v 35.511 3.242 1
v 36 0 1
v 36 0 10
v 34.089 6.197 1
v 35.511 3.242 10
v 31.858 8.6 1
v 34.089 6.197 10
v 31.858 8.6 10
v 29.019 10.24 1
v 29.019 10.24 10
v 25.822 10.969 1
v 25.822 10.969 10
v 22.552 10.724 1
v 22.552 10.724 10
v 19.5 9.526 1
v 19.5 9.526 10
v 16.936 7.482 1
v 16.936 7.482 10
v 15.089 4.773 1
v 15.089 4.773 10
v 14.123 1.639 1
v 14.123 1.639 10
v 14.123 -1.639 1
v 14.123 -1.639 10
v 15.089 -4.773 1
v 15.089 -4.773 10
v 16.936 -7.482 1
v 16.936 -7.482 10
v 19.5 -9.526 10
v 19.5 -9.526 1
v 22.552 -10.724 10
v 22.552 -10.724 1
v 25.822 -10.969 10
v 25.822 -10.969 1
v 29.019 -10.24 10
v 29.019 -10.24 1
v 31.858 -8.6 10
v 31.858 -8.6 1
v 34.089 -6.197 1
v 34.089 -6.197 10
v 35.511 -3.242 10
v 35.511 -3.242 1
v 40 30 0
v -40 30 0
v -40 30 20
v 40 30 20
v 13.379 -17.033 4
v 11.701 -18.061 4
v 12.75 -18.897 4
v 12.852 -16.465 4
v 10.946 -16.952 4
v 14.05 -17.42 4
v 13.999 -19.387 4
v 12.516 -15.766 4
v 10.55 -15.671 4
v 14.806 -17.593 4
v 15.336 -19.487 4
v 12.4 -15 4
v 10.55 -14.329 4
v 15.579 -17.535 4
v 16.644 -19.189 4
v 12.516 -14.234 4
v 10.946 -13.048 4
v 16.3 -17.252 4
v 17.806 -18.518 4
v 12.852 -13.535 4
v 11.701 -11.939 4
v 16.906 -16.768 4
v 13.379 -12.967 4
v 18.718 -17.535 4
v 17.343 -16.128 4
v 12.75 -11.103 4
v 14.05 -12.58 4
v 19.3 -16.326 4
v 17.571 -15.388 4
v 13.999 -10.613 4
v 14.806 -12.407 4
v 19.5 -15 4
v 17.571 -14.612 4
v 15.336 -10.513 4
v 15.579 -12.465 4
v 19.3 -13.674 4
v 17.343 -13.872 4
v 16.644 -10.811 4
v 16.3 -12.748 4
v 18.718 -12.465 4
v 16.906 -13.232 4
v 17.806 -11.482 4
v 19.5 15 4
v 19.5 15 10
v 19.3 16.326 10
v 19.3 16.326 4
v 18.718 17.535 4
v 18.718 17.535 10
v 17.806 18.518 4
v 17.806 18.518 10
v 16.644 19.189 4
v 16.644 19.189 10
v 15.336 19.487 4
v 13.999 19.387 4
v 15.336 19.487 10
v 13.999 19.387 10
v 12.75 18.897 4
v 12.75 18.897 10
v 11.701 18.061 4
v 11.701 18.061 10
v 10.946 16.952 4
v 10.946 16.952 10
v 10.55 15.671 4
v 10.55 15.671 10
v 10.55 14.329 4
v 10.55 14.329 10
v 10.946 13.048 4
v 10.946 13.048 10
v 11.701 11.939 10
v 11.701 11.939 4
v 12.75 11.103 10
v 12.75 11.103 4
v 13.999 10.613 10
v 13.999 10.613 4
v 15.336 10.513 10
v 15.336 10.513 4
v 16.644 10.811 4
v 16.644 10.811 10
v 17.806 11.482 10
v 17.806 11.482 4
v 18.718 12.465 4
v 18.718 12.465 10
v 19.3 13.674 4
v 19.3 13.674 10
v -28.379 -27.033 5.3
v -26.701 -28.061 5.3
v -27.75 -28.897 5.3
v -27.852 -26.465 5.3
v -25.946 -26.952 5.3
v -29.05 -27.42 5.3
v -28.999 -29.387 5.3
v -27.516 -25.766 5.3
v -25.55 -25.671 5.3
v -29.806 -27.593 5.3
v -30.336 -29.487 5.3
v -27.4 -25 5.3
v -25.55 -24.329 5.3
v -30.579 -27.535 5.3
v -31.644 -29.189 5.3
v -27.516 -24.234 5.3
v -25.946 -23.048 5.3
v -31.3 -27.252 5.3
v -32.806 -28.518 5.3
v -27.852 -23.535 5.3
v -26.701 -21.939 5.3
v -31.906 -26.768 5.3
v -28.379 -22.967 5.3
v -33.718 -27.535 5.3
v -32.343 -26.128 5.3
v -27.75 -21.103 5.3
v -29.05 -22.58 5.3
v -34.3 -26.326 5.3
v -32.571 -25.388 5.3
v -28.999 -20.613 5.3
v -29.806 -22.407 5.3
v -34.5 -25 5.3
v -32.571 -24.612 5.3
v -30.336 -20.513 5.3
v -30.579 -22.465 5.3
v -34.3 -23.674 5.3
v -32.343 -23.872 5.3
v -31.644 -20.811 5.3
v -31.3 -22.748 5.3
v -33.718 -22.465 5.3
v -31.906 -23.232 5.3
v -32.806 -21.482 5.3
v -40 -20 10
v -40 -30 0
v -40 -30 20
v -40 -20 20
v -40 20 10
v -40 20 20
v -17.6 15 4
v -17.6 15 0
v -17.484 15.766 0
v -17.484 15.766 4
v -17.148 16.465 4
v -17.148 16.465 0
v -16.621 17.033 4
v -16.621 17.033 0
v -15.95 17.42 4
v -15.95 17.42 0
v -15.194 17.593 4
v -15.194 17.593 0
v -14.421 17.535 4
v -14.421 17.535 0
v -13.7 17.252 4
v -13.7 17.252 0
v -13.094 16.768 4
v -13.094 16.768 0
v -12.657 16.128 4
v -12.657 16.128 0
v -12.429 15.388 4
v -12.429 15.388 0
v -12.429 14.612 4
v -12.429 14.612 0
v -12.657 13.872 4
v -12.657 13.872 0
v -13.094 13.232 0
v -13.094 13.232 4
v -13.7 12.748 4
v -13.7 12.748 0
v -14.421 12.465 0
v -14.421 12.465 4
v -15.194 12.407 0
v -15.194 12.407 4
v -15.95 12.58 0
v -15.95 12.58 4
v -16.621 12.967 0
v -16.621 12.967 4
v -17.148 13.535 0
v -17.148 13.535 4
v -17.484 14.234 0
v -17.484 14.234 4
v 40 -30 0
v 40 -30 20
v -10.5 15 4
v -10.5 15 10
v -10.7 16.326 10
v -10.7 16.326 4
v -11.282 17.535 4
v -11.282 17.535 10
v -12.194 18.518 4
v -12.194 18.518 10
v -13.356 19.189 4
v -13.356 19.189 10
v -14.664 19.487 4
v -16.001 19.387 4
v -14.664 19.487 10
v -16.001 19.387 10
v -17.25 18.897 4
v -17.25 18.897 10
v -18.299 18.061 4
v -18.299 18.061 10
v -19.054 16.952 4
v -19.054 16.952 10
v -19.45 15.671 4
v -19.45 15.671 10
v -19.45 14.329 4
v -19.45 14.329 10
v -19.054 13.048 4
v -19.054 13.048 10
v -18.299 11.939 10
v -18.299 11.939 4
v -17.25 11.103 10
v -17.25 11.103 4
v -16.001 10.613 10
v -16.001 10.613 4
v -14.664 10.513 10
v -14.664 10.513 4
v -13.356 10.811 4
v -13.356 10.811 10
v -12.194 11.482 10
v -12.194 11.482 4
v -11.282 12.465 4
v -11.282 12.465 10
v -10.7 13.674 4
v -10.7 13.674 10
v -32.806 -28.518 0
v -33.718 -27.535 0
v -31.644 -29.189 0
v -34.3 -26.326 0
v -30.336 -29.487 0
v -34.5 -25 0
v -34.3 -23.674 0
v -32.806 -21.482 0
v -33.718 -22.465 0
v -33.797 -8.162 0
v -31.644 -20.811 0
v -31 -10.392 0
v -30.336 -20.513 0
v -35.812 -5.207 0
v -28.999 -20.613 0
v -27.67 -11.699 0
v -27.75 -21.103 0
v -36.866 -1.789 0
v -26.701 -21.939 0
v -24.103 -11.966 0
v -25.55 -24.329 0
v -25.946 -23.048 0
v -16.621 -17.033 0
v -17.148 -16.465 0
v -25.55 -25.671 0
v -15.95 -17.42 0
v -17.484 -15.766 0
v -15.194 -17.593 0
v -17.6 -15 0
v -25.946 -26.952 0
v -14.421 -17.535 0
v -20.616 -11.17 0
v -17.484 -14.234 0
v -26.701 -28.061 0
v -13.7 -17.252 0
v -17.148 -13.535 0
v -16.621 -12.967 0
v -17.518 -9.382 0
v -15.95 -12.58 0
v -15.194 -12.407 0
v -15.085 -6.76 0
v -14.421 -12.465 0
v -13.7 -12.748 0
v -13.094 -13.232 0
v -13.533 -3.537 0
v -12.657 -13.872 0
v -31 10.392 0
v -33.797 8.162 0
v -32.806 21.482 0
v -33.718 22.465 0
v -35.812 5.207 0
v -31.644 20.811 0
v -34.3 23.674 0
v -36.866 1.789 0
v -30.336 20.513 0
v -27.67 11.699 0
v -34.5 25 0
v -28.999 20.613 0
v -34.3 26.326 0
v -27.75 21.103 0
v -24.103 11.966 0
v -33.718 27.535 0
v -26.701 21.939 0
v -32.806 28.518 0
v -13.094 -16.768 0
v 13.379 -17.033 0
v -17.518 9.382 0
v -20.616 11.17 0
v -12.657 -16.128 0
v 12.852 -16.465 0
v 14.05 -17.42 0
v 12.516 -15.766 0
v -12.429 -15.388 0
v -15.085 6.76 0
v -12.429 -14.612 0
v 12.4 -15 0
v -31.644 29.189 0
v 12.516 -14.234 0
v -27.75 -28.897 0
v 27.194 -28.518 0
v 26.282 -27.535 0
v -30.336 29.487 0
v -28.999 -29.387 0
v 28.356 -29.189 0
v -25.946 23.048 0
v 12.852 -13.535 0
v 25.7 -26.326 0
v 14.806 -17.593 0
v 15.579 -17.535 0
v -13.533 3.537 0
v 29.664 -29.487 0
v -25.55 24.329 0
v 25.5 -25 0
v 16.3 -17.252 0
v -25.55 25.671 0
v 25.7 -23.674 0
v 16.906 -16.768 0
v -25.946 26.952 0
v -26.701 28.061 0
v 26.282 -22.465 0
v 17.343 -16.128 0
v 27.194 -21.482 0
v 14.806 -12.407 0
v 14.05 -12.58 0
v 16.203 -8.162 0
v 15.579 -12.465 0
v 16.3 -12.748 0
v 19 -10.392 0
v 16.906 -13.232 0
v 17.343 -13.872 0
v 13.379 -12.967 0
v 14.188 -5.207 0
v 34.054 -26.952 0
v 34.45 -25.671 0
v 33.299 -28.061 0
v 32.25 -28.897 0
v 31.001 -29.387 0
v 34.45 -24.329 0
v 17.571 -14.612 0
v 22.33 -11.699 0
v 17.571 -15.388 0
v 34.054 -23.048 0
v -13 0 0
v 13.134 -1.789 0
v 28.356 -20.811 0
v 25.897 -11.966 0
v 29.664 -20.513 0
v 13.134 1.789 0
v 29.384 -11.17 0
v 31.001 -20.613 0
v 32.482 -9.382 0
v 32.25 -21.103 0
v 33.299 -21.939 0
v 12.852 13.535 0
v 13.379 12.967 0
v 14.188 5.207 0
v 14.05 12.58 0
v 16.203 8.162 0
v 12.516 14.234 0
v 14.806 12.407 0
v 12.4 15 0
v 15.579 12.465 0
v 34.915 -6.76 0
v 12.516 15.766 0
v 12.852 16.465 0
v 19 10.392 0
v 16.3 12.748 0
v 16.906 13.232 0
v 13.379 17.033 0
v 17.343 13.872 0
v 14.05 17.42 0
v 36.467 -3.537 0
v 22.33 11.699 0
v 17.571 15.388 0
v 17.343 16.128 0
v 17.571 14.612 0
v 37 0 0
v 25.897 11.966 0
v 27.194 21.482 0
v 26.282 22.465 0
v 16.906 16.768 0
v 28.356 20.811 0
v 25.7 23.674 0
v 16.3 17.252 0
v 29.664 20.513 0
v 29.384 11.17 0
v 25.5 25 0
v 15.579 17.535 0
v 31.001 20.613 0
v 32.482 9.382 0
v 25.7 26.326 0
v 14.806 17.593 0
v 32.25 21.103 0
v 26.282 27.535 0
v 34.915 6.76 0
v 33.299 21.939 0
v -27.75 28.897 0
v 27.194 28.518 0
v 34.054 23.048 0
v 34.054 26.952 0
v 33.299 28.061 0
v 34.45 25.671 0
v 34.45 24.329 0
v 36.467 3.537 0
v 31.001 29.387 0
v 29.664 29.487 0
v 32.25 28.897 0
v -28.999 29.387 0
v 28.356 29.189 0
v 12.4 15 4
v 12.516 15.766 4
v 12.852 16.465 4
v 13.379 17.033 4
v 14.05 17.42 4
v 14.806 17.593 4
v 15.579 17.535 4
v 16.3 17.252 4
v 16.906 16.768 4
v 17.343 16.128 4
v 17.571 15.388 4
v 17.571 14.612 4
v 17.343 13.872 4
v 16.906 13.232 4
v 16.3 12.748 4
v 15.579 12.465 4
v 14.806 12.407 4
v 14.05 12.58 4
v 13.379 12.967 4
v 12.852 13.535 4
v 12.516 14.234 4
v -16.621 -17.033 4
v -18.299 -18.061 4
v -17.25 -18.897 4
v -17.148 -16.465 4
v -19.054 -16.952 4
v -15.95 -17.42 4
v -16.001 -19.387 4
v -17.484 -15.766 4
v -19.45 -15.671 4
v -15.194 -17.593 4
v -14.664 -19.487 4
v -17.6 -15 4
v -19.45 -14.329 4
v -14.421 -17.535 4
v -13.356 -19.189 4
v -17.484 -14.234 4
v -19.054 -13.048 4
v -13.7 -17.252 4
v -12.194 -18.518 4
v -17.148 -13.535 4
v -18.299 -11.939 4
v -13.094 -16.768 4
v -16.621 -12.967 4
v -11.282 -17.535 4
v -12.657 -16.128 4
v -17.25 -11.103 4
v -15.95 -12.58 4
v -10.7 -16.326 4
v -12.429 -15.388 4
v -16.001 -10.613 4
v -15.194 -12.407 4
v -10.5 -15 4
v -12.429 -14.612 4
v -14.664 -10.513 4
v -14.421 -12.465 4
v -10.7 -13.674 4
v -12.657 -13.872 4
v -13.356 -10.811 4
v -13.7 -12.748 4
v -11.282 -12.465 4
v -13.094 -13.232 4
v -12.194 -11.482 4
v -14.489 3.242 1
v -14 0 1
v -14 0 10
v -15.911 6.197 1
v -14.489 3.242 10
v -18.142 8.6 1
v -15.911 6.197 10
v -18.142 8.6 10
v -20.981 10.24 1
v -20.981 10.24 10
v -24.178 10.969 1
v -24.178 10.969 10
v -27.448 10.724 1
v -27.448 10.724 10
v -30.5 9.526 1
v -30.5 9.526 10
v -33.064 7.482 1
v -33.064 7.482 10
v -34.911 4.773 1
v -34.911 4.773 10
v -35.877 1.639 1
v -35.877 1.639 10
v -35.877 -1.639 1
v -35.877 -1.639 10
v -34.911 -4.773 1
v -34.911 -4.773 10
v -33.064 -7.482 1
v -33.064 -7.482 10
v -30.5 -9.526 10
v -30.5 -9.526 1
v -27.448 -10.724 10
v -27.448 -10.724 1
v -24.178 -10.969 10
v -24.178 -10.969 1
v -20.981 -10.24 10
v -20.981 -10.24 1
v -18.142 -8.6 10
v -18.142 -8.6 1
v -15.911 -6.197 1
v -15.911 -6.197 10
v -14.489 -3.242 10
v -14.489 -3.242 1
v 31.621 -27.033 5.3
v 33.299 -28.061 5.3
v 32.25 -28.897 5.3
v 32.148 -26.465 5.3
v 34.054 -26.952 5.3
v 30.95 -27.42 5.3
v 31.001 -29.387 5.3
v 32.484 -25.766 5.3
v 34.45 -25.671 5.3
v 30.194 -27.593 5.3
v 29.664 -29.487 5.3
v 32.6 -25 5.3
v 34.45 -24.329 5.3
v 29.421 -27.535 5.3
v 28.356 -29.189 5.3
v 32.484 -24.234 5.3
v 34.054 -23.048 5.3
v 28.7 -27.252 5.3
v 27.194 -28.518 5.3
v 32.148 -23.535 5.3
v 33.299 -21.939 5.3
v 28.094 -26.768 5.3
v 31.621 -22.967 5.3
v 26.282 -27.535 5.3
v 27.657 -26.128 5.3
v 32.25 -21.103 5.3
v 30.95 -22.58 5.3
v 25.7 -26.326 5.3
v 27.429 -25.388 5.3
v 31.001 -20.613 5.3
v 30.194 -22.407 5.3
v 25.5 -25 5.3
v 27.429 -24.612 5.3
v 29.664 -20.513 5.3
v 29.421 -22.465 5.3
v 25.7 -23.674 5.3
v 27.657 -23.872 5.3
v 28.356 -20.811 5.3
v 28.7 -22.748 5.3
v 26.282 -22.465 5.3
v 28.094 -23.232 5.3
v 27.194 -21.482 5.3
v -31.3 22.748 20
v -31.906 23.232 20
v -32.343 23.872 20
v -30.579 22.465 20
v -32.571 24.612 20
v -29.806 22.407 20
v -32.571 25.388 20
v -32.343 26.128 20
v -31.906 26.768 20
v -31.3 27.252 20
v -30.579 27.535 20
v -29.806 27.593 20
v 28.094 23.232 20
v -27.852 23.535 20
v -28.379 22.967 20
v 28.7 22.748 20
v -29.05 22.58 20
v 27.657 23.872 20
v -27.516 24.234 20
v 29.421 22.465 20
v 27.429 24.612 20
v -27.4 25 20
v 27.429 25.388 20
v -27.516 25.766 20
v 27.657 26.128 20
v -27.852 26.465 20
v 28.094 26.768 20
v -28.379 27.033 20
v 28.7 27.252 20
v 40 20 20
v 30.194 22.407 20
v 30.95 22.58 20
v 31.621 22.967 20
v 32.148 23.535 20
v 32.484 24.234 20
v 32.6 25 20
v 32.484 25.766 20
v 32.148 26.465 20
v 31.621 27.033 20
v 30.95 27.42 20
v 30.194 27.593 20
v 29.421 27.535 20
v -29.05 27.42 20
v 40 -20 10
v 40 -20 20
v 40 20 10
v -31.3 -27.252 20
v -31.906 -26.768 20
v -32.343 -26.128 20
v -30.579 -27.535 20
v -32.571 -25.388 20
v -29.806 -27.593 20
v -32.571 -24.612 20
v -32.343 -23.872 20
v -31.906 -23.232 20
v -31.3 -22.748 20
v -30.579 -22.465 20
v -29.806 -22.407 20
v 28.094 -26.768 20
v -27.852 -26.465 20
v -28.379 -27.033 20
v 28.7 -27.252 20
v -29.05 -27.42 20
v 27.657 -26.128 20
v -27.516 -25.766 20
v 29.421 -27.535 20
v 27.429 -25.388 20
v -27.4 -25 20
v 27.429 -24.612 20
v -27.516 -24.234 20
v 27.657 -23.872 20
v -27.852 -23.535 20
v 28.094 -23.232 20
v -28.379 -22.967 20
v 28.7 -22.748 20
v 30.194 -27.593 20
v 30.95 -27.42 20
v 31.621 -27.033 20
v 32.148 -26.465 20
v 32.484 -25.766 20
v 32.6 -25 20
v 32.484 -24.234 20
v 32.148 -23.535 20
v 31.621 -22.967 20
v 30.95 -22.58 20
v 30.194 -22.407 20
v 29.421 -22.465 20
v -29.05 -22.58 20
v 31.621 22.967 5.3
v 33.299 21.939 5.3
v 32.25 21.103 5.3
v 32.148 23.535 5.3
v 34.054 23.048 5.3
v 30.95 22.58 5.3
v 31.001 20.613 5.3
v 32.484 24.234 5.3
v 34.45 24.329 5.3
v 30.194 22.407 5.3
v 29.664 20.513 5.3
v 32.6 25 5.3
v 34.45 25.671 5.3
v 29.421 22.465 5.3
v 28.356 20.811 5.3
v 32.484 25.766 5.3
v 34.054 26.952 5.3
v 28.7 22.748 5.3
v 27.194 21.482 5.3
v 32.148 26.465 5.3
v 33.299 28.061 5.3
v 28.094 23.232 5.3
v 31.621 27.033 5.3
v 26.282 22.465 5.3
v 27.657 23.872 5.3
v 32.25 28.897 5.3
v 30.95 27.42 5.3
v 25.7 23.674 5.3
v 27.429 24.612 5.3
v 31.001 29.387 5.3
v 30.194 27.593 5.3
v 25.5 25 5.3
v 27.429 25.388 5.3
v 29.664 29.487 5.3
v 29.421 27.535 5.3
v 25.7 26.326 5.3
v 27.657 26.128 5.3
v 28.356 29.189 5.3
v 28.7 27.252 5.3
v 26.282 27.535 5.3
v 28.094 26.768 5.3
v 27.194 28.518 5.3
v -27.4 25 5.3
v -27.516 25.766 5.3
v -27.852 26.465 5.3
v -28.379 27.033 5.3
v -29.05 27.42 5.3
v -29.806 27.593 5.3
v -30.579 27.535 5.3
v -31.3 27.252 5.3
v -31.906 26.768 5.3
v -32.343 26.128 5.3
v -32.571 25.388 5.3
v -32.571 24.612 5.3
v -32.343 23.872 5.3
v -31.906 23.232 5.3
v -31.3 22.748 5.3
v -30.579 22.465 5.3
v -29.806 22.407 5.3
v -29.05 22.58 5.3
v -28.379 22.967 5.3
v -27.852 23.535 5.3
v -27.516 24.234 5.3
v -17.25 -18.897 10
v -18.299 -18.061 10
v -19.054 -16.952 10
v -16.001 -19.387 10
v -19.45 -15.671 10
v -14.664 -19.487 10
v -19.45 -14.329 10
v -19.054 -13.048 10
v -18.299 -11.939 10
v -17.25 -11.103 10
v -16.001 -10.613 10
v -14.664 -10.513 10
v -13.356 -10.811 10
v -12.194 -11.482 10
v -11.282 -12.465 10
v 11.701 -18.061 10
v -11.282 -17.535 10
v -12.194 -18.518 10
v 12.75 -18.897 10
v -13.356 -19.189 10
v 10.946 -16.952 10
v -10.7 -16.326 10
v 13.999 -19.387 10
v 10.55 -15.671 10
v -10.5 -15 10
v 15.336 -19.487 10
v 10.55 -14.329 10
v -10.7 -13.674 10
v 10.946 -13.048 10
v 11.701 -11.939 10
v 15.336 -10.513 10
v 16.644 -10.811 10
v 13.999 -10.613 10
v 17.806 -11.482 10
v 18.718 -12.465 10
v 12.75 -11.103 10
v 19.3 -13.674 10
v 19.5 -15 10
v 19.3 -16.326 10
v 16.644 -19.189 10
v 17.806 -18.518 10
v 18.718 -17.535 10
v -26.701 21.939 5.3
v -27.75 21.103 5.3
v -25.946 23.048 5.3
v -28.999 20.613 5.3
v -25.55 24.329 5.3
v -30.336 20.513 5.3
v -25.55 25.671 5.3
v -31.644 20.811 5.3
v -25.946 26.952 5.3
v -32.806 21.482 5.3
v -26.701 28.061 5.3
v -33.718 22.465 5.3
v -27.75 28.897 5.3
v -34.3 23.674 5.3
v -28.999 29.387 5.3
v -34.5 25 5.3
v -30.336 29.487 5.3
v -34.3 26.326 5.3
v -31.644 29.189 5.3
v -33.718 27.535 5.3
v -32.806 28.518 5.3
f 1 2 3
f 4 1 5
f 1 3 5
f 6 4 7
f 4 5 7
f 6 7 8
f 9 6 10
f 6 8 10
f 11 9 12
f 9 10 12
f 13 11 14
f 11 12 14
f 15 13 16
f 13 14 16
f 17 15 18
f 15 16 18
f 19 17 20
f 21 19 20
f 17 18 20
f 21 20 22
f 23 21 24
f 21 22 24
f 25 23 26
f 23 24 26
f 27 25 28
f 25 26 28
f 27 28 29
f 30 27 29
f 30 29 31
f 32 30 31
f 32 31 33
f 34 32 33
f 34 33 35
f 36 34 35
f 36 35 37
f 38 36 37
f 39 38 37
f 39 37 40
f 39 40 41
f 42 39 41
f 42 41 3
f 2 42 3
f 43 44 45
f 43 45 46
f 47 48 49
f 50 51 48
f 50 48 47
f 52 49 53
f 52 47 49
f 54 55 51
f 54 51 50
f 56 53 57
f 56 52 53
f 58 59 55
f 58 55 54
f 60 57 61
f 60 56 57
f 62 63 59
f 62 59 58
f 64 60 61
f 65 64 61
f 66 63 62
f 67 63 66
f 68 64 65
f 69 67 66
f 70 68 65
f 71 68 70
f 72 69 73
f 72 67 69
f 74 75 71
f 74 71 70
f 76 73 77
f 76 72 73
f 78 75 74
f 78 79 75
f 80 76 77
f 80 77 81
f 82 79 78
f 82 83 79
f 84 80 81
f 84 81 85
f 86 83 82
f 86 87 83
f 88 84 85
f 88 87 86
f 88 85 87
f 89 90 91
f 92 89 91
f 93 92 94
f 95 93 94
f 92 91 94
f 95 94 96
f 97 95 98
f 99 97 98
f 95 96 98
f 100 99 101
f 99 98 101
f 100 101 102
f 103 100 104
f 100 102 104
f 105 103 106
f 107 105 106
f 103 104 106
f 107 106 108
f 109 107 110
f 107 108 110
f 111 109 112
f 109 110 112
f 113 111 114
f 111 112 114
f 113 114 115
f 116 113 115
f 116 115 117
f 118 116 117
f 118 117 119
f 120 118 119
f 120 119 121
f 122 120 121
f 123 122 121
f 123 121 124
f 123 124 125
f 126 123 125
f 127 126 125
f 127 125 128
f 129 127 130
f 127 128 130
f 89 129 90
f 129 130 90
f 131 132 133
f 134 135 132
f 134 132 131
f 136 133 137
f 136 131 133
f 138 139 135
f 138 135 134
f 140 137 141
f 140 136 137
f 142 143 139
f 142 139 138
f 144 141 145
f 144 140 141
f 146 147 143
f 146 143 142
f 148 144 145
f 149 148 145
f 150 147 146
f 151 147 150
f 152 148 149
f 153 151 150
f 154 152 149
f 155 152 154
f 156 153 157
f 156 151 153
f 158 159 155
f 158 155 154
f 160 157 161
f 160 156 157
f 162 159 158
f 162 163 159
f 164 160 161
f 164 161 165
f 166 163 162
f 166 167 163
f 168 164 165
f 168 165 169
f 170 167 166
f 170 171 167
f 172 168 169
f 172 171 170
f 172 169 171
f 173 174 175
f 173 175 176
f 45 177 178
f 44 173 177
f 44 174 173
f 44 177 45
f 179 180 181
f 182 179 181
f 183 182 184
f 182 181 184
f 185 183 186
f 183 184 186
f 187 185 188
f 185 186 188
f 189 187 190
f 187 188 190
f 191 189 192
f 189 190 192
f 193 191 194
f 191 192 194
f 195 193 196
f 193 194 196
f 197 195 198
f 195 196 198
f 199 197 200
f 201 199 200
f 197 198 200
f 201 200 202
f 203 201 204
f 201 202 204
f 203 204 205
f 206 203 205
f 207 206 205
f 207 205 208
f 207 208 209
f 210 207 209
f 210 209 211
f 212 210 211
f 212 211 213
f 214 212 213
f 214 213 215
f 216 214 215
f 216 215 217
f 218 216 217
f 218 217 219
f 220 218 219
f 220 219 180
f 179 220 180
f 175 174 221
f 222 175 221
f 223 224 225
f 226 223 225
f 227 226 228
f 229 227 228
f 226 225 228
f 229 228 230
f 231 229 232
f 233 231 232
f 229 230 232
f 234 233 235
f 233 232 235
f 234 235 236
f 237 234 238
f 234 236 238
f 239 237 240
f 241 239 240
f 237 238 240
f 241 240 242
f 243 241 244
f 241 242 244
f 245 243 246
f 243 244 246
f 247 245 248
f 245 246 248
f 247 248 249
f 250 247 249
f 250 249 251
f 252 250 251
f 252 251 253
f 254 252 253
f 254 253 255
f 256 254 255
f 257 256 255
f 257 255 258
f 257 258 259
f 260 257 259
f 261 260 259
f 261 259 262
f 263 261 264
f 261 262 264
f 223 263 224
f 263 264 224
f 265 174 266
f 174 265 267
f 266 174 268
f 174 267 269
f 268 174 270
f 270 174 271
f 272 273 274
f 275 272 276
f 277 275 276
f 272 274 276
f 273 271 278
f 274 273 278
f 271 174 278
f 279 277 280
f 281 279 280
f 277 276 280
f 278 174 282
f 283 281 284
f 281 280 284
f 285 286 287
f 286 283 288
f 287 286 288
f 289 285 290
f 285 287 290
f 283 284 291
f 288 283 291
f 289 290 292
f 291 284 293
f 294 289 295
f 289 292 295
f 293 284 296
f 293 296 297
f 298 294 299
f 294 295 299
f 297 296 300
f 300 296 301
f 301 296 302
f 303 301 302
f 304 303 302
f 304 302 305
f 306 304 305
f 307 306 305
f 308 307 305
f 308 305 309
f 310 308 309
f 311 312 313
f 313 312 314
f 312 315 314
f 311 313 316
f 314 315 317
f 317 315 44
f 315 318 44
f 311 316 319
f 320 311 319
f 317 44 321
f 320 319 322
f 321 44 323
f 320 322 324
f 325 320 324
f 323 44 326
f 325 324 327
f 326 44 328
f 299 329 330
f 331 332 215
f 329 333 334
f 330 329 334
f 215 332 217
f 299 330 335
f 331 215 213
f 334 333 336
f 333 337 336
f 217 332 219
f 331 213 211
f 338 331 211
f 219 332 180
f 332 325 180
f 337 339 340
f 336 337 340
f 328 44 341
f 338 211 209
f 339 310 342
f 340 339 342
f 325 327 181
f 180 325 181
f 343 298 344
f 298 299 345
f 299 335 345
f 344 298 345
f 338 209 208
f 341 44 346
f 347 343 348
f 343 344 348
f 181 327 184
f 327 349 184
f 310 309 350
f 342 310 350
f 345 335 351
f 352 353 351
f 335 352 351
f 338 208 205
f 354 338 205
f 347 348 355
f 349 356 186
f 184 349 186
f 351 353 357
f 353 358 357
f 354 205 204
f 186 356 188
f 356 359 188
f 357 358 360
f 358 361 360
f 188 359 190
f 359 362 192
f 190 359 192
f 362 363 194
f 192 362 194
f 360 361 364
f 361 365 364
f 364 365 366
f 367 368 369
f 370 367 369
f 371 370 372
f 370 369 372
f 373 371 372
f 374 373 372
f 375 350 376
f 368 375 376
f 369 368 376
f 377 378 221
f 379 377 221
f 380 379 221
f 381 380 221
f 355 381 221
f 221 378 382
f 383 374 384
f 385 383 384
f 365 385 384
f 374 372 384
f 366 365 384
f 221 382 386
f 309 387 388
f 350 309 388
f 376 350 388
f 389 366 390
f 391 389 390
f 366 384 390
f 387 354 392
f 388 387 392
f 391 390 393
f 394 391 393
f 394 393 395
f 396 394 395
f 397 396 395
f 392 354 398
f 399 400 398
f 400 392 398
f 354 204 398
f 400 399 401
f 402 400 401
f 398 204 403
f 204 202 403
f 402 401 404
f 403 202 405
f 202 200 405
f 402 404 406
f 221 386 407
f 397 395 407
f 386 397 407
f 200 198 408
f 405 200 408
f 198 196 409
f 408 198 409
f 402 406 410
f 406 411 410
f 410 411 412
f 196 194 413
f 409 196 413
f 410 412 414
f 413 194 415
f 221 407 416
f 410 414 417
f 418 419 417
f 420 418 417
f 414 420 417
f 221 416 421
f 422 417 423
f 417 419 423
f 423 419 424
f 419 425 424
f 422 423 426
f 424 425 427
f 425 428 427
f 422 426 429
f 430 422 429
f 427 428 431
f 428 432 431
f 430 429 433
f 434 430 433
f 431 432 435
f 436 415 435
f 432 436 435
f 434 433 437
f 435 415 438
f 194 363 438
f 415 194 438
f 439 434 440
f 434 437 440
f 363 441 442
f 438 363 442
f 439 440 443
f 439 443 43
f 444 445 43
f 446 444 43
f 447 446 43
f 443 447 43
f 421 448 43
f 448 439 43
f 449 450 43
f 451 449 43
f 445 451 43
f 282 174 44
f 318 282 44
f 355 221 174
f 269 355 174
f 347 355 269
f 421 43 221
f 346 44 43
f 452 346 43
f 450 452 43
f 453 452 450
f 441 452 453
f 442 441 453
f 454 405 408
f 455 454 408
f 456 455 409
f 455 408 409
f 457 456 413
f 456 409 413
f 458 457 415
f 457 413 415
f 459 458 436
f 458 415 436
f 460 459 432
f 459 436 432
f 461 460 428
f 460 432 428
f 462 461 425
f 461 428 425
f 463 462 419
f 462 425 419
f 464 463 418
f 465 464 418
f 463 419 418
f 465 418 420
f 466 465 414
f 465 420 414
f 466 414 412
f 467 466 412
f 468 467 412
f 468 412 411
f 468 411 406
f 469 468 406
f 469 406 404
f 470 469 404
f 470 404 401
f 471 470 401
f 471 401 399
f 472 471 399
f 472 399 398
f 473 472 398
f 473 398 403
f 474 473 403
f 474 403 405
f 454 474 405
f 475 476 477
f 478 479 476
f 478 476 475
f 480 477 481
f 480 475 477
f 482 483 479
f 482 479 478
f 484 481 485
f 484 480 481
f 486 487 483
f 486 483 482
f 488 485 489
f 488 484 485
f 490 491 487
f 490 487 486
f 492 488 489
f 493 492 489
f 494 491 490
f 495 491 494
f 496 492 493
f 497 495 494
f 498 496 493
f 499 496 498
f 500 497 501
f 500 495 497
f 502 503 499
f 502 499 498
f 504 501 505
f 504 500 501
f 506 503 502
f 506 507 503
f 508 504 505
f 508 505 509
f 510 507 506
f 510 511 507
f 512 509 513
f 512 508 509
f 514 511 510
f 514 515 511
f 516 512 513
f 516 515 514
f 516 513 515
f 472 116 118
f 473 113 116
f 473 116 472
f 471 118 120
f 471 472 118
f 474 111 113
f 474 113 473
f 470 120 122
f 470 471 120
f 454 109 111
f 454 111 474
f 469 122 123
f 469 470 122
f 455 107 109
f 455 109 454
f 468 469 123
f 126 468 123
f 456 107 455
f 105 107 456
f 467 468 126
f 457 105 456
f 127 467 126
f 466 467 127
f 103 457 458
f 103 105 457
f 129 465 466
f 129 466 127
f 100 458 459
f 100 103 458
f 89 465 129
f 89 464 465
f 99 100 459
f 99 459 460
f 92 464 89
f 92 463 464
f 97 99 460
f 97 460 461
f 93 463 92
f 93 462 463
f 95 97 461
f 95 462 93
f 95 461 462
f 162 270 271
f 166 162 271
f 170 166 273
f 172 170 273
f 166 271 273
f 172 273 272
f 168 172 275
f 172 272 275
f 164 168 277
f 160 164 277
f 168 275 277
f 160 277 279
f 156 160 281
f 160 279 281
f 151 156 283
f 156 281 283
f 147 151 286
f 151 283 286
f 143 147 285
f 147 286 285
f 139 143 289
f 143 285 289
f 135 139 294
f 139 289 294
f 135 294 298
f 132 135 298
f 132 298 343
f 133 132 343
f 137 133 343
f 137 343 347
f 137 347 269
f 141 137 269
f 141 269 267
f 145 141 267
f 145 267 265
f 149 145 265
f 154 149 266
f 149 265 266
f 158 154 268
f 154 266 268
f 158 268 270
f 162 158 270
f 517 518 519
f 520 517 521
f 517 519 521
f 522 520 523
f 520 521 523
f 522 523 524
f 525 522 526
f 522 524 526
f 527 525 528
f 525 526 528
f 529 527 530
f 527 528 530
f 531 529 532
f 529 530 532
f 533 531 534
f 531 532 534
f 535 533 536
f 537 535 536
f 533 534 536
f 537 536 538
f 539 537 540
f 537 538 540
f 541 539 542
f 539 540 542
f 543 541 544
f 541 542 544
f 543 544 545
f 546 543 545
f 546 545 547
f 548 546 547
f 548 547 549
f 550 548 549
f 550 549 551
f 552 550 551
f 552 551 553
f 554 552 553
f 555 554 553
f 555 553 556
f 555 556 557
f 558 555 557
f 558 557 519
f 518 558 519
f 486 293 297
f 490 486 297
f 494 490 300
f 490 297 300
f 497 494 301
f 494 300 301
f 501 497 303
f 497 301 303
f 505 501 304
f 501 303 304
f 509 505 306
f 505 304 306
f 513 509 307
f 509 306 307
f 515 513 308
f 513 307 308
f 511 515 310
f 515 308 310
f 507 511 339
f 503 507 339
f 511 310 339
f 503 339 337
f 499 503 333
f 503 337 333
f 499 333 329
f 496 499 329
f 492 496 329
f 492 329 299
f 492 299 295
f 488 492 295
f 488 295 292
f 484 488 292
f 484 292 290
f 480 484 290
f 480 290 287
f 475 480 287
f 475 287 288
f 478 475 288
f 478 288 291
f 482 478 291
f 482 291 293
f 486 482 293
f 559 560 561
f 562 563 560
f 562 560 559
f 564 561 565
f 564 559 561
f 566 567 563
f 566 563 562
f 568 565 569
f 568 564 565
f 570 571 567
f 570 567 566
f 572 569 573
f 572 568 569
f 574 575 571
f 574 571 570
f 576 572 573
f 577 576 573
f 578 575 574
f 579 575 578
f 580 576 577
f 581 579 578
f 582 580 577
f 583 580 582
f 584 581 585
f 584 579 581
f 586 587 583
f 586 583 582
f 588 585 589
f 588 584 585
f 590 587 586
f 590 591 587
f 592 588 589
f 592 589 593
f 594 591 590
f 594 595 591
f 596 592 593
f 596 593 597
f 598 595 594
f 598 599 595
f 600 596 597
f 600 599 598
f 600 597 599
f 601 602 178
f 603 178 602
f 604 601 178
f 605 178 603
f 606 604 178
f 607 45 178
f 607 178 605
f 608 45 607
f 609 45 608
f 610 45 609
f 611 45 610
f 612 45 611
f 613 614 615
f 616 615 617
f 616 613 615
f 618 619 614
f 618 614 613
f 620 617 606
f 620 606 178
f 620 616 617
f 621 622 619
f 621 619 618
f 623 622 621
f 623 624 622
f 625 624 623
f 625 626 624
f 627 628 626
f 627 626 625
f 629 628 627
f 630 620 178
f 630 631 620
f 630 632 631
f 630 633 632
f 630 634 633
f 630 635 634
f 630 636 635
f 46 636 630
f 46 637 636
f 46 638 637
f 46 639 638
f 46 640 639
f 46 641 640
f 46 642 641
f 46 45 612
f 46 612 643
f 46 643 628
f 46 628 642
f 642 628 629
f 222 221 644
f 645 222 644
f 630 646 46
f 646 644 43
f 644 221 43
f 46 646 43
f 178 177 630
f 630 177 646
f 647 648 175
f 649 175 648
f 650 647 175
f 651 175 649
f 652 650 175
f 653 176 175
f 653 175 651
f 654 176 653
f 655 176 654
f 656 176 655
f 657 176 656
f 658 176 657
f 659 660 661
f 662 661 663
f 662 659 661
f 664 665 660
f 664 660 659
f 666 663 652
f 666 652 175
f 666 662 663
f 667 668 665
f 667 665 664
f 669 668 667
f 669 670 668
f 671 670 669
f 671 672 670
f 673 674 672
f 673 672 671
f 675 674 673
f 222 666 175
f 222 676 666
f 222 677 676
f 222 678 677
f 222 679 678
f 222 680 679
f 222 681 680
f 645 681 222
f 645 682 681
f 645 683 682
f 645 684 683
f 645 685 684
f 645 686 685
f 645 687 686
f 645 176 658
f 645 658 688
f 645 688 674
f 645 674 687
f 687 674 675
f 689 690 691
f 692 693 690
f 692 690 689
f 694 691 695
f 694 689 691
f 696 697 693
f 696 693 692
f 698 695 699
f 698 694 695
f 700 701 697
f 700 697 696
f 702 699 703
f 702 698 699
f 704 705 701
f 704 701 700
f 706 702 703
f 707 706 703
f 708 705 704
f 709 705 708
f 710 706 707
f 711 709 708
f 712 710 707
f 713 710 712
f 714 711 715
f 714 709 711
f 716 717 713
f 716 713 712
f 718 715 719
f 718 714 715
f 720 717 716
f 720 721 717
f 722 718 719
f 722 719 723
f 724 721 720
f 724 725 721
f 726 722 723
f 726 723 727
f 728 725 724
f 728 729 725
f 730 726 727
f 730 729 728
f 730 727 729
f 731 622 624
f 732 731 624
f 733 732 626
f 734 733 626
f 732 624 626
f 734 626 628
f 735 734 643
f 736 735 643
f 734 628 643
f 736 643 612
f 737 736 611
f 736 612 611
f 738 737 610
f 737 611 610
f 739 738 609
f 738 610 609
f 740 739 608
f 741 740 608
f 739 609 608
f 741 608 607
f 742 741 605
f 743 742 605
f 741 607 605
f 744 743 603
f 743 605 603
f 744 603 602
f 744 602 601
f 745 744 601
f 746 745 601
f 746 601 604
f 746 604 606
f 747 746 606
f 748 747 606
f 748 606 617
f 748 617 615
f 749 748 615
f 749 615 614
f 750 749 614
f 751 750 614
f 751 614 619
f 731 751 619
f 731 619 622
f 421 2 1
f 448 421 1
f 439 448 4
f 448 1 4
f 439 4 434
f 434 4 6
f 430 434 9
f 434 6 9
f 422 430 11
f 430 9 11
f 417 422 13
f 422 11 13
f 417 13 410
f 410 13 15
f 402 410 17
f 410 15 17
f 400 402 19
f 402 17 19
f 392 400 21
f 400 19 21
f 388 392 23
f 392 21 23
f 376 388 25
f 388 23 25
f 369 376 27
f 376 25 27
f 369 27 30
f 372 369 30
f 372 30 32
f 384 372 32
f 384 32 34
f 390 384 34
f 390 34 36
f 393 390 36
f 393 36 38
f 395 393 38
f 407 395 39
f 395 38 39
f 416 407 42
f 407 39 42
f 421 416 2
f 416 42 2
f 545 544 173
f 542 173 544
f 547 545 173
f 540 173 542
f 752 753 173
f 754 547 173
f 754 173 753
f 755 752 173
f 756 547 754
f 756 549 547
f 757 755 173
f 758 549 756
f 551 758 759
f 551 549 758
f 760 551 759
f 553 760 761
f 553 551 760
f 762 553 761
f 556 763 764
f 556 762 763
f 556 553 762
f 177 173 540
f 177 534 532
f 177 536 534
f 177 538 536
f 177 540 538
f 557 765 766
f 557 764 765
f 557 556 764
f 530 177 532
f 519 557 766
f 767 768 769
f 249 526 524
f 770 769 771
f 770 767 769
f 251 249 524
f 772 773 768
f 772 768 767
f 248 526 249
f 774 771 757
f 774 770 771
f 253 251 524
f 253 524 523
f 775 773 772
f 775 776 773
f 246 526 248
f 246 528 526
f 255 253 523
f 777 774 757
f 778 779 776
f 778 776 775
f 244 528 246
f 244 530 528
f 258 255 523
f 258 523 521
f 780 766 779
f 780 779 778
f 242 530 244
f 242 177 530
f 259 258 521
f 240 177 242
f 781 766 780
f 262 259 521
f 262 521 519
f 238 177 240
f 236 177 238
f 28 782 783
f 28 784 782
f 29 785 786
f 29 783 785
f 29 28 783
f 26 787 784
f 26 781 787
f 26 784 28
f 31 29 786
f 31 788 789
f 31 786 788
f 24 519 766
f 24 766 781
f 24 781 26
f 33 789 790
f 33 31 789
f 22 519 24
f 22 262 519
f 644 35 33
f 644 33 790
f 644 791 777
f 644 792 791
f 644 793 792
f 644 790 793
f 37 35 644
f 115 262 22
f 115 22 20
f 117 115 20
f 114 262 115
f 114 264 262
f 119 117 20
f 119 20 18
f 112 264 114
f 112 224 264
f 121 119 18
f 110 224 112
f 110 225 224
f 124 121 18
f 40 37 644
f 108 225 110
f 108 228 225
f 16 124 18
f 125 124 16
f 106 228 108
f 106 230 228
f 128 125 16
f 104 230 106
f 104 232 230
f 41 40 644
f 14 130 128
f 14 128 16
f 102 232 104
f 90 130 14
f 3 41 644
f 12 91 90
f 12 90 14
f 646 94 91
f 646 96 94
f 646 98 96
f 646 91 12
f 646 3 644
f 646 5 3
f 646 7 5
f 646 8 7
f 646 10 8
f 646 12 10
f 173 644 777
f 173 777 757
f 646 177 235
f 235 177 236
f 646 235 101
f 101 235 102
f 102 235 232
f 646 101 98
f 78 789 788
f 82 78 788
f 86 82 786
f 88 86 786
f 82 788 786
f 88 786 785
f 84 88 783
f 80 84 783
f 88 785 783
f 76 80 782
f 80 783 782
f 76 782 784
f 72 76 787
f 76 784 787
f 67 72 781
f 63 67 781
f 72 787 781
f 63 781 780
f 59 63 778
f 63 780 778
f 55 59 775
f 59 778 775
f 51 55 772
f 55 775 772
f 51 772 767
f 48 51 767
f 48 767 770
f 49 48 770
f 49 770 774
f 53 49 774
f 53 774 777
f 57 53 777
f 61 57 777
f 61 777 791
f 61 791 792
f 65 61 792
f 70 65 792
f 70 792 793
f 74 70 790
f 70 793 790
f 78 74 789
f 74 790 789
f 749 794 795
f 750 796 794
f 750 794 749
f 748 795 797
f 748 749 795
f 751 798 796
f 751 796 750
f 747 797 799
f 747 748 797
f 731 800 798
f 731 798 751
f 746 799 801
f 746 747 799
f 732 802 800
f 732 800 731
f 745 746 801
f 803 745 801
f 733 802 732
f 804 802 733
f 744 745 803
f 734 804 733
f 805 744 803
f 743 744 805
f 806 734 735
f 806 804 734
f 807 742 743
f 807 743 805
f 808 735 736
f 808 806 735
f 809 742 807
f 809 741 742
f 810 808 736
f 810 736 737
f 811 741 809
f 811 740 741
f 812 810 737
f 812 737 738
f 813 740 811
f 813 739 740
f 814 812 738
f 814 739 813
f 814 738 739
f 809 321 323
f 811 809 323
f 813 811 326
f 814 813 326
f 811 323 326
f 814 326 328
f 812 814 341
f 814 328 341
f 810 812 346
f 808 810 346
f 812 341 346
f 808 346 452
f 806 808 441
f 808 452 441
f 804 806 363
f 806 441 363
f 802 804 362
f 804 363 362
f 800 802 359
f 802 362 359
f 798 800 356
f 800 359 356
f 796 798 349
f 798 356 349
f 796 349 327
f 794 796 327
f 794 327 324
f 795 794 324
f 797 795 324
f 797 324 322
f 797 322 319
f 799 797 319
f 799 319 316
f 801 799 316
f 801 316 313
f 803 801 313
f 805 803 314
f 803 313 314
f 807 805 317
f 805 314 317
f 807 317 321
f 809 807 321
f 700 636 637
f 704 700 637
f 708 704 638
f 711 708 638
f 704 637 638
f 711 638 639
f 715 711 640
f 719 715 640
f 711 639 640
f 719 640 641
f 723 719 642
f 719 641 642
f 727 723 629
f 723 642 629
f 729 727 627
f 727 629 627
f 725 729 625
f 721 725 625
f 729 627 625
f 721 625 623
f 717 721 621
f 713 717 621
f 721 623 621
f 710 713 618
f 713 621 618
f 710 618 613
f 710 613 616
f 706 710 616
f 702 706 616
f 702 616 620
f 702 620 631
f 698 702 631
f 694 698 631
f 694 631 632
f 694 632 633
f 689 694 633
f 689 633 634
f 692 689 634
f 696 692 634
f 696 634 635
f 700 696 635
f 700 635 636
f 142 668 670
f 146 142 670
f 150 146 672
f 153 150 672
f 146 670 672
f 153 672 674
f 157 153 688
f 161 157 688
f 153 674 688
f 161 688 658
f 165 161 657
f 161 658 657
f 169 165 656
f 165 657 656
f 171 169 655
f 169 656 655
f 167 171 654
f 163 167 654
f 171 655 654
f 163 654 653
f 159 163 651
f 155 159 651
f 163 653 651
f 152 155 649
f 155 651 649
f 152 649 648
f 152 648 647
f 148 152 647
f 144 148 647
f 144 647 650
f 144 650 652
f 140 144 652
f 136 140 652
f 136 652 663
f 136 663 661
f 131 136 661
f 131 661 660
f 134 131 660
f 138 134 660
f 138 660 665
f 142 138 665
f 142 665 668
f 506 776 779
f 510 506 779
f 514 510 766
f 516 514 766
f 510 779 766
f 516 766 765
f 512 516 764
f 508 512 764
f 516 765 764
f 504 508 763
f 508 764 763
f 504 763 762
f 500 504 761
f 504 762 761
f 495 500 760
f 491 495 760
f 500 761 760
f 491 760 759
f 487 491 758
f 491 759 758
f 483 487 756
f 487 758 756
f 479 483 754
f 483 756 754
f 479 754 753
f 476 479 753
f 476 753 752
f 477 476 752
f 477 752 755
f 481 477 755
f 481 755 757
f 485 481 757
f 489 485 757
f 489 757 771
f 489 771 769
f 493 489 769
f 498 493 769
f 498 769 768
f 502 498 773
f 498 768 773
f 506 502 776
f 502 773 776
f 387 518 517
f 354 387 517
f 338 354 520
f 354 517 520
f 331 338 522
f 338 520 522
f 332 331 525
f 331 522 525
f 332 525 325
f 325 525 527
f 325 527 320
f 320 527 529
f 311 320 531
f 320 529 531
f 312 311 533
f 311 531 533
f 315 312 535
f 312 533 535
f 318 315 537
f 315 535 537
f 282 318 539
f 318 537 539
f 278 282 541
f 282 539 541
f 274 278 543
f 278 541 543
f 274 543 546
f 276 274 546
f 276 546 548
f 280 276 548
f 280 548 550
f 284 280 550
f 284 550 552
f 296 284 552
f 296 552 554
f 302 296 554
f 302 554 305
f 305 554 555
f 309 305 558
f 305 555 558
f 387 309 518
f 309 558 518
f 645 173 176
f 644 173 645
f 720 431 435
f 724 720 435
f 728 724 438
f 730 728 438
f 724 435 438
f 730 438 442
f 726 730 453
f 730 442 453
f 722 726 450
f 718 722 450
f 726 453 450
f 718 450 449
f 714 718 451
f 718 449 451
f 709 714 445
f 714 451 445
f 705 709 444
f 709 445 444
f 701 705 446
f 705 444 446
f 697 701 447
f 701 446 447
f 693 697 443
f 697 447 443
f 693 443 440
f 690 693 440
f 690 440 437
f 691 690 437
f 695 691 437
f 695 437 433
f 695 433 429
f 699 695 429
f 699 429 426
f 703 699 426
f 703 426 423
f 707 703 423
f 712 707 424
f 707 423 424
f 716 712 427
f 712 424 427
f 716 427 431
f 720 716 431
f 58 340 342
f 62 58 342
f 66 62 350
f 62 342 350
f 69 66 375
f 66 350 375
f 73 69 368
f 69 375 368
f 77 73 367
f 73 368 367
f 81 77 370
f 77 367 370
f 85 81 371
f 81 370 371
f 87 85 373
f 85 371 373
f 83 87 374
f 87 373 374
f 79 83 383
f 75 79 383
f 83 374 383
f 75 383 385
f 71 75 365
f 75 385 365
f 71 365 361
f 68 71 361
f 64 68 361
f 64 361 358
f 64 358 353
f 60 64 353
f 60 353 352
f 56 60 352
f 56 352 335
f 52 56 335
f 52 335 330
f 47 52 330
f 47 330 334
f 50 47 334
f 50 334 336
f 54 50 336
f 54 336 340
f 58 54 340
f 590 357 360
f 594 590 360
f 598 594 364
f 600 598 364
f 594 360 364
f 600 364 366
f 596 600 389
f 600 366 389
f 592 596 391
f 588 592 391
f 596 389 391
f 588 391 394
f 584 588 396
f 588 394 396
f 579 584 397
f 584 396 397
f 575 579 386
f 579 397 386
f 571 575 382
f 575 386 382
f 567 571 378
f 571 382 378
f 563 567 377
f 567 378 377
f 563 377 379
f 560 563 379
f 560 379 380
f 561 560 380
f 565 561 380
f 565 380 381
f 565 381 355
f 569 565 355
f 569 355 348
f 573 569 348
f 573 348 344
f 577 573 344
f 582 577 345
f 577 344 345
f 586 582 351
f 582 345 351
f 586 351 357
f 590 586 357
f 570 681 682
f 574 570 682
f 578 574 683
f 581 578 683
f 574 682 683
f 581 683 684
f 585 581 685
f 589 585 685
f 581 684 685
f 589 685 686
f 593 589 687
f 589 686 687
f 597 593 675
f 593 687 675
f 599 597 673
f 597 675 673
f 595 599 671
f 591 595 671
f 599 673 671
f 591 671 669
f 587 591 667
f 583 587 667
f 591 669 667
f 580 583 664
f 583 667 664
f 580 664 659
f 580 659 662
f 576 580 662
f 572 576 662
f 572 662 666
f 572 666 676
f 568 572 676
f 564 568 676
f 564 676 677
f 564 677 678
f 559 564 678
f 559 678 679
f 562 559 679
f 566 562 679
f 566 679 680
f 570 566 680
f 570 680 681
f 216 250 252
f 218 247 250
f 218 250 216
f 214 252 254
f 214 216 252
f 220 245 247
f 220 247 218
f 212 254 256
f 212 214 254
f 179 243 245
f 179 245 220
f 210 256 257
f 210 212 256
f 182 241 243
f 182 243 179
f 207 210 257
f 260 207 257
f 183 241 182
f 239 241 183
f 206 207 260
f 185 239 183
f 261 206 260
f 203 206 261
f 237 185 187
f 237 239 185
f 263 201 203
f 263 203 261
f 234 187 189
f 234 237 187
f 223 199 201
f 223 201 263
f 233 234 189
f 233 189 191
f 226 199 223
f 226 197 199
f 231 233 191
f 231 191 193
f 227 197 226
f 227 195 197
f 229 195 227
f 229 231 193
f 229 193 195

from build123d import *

# Parameters (mm, degrees)
SKIZZE1_W                       = 80
SKIZZE1_H                       = 60
AUFSATZ_LINEAR_AUSTRAGEN1_DEPTH = 10
SKIZZE2_W                       = 80
SKIZZE2_H                       = 10
AUFSATZ_LINEAR_AUSTRAGEN2_DEPTH = 10
SKIZZE5_R                       = 2.6
SCHNITT_LINEAR_AUSTRAGEN3_DEPTH = 20
SKIZZE6_R                       = 11
SCHNITT_LINEAR_AUSTRAGEN4_DEPTH = 12.2
FASE1_SIZE                      = 1
SKIZZE7_R                       = 4.5
SCHNITT_LINEAR_AUSTRAGEN5_DEPTH = 5.3
SKIZZE8_R                       = 2.6
SCHNITT_LINEAR_AUSTRAGEN6_DEPTH = 10
SKIZZE9_R                       = 4.5
SCHNITT_LINEAR_AUSTRAGEN7_DEPTH = 6


with BuildPart() as part:
    # Skizze1 → Aufsatz-Linear austragen1 (new body)
    with BuildSketch(Plane.XY):
        Rectangle(SKIZZE1_W, SKIZZE1_H)
    extrude(amount=AUFSATZ_LINEAR_AUSTRAGEN1_DEPTH)

    # Skizze2 → Aufsatz-Linear austragen2 (add)
    with BuildSketch(Plane.XY.offset(10)):
        with Locations((0, 25)):
            Rectangle(SKIZZE2_W, SKIZZE2_H)
        with Locations((0, -25)):
            Rectangle(SKIZZE2_W, SKIZZE2_H)
    extrude(amount=AUFSATZ_LINEAR_AUSTRAGEN2_DEPTH)

    # Skizze5 → Schnitt-Linear austragen3 (cut)
    with BuildSketch(Plane.XY.offset(20)):
        with Locations((30, 25)):
            Circle(SKIZZE5_R)
        with Locations((-30, 25)):
            Circle(SKIZZE5_R)
        with Locations((-30, -25)):
            Circle(SKIZZE5_R)
        with Locations((30, -25)):
            Circle(SKIZZE5_R)
    extrude(amount=-SCHNITT_LINEAR_AUSTRAGEN3_DEPTH, mode=Mode.SUBTRACT)

    # Skizze6 → Schnitt-Linear austragen4 (cut)
    with BuildSketch(Plane.XY.offset(10)):
        with Locations((-25, 0)):
            Circle(SKIZZE6_R)
        with Locations((25, 0)):
            Circle(SKIZZE6_R)
    extrude(amount=-SCHNITT_LINEAR_AUSTRAGEN4_DEPTH, mode=Mode.SUBTRACT)

    # Fase1
    fase1_edges = [part.edges().sort_by_distance(p)[0] for p in [
        (-36, 0, 0),
        (14, 0, 0),
    ]]
    chamfer(fase1_edges, length=FASE1_SIZE)

    # Skizze7 → Schnitt-Linear austragen5 (cut)
    with BuildSketch(Plane(origin=(0, 0, 0), x_dir=(-1, 0, 0), z_dir=(0, 0, -1))):
        with Locations((-30, 25)):
            Circle(SKIZZE7_R)
        with Locations((30, 25)):
            Circle(SKIZZE7_R)
        with Locations((30, -25)):
            Circle(SKIZZE7_R)
        with Locations((-30, -25)):
            Circle(SKIZZE7_R)
    extrude(amount=-SCHNITT_LINEAR_AUSTRAGEN5_DEPTH, mode=Mode.SUBTRACT)

    # Skizze8 → Schnitt-Linear austragen6 (cut)
    with BuildSketch(Plane(origin=(0, 0, 0), x_dir=(-1, 0, 0), z_dir=(0, 0, -1))):
        with Locations((-15, 15)):
            Circle(SKIZZE8_R)
        with Locations((15, 15)):
            Circle(SKIZZE8_R)
        with Locations((15, -15)):
            Circle(SKIZZE8_R)
        with Locations((-15, -15)):
            Circle(SKIZZE8_R)
    extrude(amount=-SCHNITT_LINEAR_AUSTRAGEN6_DEPTH, mode=Mode.SUBTRACT)

    # Skizze9 → Schnitt-Linear austragen7 (cut)
    with BuildSketch(Plane.XY.offset(10)):
        with Locations((15, 15)):
            Circle(SKIZZE9_R)
        with Locations((-15, 15)):
            Circle(SKIZZE9_R)
        with Locations((-15, -15)):
            Circle(SKIZZE9_R)
        with Locations((15, -15)):
            Circle(SKIZZE9_R)
    extrude(amount=-SCHNITT_LINEAR_AUSTRAGEN7_DEPTH, mode=Mode.SUBTRACT)


solid = part.part
